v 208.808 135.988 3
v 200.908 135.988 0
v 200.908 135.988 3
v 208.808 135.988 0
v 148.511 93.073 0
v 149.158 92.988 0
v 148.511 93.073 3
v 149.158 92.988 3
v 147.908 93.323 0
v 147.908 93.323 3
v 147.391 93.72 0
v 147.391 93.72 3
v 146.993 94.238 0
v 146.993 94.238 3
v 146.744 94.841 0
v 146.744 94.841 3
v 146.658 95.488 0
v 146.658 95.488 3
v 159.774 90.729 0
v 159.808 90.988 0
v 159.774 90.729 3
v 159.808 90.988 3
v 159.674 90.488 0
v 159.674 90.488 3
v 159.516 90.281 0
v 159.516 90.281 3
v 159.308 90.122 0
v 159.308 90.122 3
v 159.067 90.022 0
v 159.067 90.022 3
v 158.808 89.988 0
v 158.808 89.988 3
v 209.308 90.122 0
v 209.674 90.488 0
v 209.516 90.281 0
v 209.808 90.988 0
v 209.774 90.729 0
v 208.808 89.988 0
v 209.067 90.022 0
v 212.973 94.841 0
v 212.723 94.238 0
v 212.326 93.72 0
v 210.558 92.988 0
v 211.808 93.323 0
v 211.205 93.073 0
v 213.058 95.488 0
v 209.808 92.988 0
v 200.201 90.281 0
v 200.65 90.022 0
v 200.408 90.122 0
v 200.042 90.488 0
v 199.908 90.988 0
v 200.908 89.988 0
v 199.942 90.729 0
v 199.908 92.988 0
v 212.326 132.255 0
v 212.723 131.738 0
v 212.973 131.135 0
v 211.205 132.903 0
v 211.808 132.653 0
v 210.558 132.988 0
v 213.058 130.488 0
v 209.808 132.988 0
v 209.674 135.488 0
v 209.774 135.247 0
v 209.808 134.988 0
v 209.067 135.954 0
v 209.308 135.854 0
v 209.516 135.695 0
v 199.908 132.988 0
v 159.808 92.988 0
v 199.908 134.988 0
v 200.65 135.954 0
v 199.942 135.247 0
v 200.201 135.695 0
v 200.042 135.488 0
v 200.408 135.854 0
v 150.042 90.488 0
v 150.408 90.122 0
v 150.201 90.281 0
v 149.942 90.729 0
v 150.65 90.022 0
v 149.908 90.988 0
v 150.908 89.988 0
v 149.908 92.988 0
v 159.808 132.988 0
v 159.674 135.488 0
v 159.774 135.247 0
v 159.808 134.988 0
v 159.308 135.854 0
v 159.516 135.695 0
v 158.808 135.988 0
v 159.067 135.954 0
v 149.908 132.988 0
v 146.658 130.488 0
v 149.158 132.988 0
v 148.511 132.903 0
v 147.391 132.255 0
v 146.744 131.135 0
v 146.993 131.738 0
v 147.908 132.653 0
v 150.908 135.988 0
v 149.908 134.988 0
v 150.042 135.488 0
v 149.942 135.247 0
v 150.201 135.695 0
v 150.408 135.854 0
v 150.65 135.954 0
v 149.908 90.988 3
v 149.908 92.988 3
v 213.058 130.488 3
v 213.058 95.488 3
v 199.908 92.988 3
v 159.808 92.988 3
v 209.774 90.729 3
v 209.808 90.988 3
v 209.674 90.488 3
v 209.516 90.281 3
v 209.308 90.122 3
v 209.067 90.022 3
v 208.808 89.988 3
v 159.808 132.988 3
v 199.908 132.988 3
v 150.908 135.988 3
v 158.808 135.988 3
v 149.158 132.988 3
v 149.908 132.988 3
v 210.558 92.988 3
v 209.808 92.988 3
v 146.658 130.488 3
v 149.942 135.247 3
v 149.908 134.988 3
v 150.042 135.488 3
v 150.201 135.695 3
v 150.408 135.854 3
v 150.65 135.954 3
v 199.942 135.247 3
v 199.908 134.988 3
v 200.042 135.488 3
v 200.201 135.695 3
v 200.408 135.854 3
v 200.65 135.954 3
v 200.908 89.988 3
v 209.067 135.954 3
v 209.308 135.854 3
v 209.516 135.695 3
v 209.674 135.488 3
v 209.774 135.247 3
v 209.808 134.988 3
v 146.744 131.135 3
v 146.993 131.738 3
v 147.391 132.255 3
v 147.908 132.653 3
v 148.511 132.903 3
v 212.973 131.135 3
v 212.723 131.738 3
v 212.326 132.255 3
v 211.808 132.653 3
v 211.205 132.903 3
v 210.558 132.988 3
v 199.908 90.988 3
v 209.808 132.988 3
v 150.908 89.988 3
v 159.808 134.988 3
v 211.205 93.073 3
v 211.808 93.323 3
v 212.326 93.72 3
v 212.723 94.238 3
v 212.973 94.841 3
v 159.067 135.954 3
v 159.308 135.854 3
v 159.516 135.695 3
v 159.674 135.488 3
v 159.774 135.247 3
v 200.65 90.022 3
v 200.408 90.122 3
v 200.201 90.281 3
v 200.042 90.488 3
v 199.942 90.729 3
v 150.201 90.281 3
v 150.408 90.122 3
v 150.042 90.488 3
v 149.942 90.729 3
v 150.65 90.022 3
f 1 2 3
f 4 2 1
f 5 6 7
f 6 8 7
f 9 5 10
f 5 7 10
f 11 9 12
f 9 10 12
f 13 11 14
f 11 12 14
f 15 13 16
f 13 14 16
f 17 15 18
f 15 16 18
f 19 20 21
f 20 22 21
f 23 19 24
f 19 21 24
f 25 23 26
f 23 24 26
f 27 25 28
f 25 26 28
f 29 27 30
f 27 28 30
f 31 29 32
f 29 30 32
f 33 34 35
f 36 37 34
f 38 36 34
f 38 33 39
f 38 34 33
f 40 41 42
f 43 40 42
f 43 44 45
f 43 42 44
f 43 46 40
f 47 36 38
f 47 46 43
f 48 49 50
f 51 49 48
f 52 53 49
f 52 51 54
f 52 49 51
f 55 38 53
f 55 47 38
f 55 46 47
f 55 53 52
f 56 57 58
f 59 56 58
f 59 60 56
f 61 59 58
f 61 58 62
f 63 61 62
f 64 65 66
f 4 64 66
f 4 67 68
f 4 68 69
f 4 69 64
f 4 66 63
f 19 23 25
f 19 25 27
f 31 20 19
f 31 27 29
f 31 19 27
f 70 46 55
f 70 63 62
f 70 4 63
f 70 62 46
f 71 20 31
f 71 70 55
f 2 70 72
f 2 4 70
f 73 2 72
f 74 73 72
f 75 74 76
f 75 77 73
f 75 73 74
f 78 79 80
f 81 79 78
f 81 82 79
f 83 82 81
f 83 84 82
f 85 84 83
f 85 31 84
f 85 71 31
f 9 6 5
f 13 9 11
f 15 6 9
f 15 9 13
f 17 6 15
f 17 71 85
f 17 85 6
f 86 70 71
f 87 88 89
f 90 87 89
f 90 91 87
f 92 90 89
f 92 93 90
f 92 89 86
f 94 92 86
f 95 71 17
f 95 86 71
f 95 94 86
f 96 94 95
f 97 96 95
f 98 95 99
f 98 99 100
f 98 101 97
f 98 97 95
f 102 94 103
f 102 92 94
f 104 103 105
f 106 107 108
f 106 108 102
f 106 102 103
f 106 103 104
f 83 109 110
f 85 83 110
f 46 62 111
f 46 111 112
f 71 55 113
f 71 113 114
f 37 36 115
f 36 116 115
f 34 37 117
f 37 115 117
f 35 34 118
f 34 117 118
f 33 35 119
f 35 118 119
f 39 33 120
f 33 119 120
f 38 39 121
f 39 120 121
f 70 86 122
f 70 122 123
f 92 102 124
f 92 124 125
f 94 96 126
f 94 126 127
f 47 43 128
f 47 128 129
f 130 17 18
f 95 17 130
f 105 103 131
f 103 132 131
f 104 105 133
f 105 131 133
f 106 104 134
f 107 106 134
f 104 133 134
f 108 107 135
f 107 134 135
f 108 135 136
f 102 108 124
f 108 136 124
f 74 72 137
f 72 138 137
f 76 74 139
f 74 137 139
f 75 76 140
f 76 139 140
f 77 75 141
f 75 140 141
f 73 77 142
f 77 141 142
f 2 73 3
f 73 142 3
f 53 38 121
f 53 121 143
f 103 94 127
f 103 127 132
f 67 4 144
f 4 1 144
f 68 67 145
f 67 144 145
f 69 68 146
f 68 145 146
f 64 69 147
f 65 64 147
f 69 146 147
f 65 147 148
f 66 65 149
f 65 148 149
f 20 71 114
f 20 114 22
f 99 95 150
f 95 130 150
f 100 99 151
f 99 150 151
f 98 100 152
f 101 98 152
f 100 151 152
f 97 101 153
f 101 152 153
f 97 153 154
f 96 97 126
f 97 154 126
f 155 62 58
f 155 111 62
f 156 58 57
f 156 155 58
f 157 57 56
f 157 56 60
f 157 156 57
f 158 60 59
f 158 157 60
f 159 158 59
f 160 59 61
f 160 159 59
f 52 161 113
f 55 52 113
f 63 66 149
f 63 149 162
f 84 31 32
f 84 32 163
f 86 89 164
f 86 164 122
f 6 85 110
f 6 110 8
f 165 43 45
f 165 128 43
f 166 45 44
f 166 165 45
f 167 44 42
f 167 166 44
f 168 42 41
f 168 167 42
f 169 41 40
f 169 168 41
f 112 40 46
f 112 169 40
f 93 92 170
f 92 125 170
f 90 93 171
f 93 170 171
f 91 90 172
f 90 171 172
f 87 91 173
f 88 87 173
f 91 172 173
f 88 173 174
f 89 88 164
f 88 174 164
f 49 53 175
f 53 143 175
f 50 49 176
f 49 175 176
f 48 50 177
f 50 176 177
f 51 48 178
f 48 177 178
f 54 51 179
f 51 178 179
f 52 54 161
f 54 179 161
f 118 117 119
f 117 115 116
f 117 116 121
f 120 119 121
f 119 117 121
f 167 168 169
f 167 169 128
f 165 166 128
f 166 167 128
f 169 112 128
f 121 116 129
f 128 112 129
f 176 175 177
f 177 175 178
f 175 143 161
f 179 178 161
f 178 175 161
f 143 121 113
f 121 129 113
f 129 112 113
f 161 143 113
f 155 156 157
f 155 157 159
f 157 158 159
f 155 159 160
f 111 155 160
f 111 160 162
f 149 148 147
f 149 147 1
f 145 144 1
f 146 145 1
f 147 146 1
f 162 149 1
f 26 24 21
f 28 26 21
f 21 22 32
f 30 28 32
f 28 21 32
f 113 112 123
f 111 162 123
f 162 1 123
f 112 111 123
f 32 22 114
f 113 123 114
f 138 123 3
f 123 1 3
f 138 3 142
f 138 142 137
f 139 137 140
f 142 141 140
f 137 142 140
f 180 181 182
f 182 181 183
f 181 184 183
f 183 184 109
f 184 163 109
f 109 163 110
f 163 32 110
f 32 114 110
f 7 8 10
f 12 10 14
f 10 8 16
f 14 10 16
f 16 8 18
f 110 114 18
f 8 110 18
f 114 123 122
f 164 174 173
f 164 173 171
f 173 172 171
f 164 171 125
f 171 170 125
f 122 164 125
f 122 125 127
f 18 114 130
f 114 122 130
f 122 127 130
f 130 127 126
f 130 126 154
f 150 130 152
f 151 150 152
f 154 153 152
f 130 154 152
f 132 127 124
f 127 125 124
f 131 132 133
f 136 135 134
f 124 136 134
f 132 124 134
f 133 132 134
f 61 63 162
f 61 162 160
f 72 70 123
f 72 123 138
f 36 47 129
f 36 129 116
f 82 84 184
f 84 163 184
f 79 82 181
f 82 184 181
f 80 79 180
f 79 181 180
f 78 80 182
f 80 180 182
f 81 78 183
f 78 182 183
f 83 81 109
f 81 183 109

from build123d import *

# Parameters (mm, degrees)
PAD_DEPTH   = 3
FILLET_R    = 1
FILLET001_R = 2.5


with BuildPart() as part:
    # Sketch → Pad (new body)
    with BuildSketch(Plane.XY):
        Polygon((13.058418, 32.987703), (13.058418, -7.012297), (9.808418, -7.012297), (9.808418, -10.012297), (-0.091582, -10.012297), (-0.091582, -7.012297), (-40.191582, -7.012297), (-40.191582, -10.012297), (-50.091582, -10.012297), (-50.091582, -7.012297), (-53.341582, -7.012297), (-53.341582, 32.987703), (-50.091582, 32.987703), (-50.091582, 35.987703), (-40.191582, 35.987703), (-40.191582, 32.987703), (-0.091582, 32.987703), (-0.091582, 35.987703), (9.808418, 35.987703), (9.808418, 32.987703), align=None)
    extrude(amount=PAD_DEPTH)

    # Fillet
    fillet_edges = [part.edges().sort_by_distance(p)[0] for p in [
        (-50.091582, 35.987703, 1.5),
        (-40.191582, 35.987703, 1.5),
        (-0.091582, 35.987703, 1.5),
        (9.808418, 35.987703, 1.5),
        (9.808418, -10.012297, 1.5),
        (-0.091582, -10.012297, 1.5),
        (-40.191582, -10.012297, 1.5),
        (-50.091582, -10.012297, 1.5),
    ]]
    fillet(fillet_edges, radius=FILLET_R)

    # Fillet001
    fillet001_edges = [part.edges().sort_by_distance(p)[0] for p in [
        (-53.341582, 32.987703, 1.5),
        (-53.341582, -7.012297, 1.5),
        (13.058418, 32.987703, 1.5),
        (13.058418, -7.012297, 1.5),
    ]]
    fillet(fillet001_edges, radius=FILLET001_R)


with BuildPart() as part_1:
    # Fillet001 placement: moved
    add(part.part.moved(Location((200, 100, 0))))


solid = part_1.part
